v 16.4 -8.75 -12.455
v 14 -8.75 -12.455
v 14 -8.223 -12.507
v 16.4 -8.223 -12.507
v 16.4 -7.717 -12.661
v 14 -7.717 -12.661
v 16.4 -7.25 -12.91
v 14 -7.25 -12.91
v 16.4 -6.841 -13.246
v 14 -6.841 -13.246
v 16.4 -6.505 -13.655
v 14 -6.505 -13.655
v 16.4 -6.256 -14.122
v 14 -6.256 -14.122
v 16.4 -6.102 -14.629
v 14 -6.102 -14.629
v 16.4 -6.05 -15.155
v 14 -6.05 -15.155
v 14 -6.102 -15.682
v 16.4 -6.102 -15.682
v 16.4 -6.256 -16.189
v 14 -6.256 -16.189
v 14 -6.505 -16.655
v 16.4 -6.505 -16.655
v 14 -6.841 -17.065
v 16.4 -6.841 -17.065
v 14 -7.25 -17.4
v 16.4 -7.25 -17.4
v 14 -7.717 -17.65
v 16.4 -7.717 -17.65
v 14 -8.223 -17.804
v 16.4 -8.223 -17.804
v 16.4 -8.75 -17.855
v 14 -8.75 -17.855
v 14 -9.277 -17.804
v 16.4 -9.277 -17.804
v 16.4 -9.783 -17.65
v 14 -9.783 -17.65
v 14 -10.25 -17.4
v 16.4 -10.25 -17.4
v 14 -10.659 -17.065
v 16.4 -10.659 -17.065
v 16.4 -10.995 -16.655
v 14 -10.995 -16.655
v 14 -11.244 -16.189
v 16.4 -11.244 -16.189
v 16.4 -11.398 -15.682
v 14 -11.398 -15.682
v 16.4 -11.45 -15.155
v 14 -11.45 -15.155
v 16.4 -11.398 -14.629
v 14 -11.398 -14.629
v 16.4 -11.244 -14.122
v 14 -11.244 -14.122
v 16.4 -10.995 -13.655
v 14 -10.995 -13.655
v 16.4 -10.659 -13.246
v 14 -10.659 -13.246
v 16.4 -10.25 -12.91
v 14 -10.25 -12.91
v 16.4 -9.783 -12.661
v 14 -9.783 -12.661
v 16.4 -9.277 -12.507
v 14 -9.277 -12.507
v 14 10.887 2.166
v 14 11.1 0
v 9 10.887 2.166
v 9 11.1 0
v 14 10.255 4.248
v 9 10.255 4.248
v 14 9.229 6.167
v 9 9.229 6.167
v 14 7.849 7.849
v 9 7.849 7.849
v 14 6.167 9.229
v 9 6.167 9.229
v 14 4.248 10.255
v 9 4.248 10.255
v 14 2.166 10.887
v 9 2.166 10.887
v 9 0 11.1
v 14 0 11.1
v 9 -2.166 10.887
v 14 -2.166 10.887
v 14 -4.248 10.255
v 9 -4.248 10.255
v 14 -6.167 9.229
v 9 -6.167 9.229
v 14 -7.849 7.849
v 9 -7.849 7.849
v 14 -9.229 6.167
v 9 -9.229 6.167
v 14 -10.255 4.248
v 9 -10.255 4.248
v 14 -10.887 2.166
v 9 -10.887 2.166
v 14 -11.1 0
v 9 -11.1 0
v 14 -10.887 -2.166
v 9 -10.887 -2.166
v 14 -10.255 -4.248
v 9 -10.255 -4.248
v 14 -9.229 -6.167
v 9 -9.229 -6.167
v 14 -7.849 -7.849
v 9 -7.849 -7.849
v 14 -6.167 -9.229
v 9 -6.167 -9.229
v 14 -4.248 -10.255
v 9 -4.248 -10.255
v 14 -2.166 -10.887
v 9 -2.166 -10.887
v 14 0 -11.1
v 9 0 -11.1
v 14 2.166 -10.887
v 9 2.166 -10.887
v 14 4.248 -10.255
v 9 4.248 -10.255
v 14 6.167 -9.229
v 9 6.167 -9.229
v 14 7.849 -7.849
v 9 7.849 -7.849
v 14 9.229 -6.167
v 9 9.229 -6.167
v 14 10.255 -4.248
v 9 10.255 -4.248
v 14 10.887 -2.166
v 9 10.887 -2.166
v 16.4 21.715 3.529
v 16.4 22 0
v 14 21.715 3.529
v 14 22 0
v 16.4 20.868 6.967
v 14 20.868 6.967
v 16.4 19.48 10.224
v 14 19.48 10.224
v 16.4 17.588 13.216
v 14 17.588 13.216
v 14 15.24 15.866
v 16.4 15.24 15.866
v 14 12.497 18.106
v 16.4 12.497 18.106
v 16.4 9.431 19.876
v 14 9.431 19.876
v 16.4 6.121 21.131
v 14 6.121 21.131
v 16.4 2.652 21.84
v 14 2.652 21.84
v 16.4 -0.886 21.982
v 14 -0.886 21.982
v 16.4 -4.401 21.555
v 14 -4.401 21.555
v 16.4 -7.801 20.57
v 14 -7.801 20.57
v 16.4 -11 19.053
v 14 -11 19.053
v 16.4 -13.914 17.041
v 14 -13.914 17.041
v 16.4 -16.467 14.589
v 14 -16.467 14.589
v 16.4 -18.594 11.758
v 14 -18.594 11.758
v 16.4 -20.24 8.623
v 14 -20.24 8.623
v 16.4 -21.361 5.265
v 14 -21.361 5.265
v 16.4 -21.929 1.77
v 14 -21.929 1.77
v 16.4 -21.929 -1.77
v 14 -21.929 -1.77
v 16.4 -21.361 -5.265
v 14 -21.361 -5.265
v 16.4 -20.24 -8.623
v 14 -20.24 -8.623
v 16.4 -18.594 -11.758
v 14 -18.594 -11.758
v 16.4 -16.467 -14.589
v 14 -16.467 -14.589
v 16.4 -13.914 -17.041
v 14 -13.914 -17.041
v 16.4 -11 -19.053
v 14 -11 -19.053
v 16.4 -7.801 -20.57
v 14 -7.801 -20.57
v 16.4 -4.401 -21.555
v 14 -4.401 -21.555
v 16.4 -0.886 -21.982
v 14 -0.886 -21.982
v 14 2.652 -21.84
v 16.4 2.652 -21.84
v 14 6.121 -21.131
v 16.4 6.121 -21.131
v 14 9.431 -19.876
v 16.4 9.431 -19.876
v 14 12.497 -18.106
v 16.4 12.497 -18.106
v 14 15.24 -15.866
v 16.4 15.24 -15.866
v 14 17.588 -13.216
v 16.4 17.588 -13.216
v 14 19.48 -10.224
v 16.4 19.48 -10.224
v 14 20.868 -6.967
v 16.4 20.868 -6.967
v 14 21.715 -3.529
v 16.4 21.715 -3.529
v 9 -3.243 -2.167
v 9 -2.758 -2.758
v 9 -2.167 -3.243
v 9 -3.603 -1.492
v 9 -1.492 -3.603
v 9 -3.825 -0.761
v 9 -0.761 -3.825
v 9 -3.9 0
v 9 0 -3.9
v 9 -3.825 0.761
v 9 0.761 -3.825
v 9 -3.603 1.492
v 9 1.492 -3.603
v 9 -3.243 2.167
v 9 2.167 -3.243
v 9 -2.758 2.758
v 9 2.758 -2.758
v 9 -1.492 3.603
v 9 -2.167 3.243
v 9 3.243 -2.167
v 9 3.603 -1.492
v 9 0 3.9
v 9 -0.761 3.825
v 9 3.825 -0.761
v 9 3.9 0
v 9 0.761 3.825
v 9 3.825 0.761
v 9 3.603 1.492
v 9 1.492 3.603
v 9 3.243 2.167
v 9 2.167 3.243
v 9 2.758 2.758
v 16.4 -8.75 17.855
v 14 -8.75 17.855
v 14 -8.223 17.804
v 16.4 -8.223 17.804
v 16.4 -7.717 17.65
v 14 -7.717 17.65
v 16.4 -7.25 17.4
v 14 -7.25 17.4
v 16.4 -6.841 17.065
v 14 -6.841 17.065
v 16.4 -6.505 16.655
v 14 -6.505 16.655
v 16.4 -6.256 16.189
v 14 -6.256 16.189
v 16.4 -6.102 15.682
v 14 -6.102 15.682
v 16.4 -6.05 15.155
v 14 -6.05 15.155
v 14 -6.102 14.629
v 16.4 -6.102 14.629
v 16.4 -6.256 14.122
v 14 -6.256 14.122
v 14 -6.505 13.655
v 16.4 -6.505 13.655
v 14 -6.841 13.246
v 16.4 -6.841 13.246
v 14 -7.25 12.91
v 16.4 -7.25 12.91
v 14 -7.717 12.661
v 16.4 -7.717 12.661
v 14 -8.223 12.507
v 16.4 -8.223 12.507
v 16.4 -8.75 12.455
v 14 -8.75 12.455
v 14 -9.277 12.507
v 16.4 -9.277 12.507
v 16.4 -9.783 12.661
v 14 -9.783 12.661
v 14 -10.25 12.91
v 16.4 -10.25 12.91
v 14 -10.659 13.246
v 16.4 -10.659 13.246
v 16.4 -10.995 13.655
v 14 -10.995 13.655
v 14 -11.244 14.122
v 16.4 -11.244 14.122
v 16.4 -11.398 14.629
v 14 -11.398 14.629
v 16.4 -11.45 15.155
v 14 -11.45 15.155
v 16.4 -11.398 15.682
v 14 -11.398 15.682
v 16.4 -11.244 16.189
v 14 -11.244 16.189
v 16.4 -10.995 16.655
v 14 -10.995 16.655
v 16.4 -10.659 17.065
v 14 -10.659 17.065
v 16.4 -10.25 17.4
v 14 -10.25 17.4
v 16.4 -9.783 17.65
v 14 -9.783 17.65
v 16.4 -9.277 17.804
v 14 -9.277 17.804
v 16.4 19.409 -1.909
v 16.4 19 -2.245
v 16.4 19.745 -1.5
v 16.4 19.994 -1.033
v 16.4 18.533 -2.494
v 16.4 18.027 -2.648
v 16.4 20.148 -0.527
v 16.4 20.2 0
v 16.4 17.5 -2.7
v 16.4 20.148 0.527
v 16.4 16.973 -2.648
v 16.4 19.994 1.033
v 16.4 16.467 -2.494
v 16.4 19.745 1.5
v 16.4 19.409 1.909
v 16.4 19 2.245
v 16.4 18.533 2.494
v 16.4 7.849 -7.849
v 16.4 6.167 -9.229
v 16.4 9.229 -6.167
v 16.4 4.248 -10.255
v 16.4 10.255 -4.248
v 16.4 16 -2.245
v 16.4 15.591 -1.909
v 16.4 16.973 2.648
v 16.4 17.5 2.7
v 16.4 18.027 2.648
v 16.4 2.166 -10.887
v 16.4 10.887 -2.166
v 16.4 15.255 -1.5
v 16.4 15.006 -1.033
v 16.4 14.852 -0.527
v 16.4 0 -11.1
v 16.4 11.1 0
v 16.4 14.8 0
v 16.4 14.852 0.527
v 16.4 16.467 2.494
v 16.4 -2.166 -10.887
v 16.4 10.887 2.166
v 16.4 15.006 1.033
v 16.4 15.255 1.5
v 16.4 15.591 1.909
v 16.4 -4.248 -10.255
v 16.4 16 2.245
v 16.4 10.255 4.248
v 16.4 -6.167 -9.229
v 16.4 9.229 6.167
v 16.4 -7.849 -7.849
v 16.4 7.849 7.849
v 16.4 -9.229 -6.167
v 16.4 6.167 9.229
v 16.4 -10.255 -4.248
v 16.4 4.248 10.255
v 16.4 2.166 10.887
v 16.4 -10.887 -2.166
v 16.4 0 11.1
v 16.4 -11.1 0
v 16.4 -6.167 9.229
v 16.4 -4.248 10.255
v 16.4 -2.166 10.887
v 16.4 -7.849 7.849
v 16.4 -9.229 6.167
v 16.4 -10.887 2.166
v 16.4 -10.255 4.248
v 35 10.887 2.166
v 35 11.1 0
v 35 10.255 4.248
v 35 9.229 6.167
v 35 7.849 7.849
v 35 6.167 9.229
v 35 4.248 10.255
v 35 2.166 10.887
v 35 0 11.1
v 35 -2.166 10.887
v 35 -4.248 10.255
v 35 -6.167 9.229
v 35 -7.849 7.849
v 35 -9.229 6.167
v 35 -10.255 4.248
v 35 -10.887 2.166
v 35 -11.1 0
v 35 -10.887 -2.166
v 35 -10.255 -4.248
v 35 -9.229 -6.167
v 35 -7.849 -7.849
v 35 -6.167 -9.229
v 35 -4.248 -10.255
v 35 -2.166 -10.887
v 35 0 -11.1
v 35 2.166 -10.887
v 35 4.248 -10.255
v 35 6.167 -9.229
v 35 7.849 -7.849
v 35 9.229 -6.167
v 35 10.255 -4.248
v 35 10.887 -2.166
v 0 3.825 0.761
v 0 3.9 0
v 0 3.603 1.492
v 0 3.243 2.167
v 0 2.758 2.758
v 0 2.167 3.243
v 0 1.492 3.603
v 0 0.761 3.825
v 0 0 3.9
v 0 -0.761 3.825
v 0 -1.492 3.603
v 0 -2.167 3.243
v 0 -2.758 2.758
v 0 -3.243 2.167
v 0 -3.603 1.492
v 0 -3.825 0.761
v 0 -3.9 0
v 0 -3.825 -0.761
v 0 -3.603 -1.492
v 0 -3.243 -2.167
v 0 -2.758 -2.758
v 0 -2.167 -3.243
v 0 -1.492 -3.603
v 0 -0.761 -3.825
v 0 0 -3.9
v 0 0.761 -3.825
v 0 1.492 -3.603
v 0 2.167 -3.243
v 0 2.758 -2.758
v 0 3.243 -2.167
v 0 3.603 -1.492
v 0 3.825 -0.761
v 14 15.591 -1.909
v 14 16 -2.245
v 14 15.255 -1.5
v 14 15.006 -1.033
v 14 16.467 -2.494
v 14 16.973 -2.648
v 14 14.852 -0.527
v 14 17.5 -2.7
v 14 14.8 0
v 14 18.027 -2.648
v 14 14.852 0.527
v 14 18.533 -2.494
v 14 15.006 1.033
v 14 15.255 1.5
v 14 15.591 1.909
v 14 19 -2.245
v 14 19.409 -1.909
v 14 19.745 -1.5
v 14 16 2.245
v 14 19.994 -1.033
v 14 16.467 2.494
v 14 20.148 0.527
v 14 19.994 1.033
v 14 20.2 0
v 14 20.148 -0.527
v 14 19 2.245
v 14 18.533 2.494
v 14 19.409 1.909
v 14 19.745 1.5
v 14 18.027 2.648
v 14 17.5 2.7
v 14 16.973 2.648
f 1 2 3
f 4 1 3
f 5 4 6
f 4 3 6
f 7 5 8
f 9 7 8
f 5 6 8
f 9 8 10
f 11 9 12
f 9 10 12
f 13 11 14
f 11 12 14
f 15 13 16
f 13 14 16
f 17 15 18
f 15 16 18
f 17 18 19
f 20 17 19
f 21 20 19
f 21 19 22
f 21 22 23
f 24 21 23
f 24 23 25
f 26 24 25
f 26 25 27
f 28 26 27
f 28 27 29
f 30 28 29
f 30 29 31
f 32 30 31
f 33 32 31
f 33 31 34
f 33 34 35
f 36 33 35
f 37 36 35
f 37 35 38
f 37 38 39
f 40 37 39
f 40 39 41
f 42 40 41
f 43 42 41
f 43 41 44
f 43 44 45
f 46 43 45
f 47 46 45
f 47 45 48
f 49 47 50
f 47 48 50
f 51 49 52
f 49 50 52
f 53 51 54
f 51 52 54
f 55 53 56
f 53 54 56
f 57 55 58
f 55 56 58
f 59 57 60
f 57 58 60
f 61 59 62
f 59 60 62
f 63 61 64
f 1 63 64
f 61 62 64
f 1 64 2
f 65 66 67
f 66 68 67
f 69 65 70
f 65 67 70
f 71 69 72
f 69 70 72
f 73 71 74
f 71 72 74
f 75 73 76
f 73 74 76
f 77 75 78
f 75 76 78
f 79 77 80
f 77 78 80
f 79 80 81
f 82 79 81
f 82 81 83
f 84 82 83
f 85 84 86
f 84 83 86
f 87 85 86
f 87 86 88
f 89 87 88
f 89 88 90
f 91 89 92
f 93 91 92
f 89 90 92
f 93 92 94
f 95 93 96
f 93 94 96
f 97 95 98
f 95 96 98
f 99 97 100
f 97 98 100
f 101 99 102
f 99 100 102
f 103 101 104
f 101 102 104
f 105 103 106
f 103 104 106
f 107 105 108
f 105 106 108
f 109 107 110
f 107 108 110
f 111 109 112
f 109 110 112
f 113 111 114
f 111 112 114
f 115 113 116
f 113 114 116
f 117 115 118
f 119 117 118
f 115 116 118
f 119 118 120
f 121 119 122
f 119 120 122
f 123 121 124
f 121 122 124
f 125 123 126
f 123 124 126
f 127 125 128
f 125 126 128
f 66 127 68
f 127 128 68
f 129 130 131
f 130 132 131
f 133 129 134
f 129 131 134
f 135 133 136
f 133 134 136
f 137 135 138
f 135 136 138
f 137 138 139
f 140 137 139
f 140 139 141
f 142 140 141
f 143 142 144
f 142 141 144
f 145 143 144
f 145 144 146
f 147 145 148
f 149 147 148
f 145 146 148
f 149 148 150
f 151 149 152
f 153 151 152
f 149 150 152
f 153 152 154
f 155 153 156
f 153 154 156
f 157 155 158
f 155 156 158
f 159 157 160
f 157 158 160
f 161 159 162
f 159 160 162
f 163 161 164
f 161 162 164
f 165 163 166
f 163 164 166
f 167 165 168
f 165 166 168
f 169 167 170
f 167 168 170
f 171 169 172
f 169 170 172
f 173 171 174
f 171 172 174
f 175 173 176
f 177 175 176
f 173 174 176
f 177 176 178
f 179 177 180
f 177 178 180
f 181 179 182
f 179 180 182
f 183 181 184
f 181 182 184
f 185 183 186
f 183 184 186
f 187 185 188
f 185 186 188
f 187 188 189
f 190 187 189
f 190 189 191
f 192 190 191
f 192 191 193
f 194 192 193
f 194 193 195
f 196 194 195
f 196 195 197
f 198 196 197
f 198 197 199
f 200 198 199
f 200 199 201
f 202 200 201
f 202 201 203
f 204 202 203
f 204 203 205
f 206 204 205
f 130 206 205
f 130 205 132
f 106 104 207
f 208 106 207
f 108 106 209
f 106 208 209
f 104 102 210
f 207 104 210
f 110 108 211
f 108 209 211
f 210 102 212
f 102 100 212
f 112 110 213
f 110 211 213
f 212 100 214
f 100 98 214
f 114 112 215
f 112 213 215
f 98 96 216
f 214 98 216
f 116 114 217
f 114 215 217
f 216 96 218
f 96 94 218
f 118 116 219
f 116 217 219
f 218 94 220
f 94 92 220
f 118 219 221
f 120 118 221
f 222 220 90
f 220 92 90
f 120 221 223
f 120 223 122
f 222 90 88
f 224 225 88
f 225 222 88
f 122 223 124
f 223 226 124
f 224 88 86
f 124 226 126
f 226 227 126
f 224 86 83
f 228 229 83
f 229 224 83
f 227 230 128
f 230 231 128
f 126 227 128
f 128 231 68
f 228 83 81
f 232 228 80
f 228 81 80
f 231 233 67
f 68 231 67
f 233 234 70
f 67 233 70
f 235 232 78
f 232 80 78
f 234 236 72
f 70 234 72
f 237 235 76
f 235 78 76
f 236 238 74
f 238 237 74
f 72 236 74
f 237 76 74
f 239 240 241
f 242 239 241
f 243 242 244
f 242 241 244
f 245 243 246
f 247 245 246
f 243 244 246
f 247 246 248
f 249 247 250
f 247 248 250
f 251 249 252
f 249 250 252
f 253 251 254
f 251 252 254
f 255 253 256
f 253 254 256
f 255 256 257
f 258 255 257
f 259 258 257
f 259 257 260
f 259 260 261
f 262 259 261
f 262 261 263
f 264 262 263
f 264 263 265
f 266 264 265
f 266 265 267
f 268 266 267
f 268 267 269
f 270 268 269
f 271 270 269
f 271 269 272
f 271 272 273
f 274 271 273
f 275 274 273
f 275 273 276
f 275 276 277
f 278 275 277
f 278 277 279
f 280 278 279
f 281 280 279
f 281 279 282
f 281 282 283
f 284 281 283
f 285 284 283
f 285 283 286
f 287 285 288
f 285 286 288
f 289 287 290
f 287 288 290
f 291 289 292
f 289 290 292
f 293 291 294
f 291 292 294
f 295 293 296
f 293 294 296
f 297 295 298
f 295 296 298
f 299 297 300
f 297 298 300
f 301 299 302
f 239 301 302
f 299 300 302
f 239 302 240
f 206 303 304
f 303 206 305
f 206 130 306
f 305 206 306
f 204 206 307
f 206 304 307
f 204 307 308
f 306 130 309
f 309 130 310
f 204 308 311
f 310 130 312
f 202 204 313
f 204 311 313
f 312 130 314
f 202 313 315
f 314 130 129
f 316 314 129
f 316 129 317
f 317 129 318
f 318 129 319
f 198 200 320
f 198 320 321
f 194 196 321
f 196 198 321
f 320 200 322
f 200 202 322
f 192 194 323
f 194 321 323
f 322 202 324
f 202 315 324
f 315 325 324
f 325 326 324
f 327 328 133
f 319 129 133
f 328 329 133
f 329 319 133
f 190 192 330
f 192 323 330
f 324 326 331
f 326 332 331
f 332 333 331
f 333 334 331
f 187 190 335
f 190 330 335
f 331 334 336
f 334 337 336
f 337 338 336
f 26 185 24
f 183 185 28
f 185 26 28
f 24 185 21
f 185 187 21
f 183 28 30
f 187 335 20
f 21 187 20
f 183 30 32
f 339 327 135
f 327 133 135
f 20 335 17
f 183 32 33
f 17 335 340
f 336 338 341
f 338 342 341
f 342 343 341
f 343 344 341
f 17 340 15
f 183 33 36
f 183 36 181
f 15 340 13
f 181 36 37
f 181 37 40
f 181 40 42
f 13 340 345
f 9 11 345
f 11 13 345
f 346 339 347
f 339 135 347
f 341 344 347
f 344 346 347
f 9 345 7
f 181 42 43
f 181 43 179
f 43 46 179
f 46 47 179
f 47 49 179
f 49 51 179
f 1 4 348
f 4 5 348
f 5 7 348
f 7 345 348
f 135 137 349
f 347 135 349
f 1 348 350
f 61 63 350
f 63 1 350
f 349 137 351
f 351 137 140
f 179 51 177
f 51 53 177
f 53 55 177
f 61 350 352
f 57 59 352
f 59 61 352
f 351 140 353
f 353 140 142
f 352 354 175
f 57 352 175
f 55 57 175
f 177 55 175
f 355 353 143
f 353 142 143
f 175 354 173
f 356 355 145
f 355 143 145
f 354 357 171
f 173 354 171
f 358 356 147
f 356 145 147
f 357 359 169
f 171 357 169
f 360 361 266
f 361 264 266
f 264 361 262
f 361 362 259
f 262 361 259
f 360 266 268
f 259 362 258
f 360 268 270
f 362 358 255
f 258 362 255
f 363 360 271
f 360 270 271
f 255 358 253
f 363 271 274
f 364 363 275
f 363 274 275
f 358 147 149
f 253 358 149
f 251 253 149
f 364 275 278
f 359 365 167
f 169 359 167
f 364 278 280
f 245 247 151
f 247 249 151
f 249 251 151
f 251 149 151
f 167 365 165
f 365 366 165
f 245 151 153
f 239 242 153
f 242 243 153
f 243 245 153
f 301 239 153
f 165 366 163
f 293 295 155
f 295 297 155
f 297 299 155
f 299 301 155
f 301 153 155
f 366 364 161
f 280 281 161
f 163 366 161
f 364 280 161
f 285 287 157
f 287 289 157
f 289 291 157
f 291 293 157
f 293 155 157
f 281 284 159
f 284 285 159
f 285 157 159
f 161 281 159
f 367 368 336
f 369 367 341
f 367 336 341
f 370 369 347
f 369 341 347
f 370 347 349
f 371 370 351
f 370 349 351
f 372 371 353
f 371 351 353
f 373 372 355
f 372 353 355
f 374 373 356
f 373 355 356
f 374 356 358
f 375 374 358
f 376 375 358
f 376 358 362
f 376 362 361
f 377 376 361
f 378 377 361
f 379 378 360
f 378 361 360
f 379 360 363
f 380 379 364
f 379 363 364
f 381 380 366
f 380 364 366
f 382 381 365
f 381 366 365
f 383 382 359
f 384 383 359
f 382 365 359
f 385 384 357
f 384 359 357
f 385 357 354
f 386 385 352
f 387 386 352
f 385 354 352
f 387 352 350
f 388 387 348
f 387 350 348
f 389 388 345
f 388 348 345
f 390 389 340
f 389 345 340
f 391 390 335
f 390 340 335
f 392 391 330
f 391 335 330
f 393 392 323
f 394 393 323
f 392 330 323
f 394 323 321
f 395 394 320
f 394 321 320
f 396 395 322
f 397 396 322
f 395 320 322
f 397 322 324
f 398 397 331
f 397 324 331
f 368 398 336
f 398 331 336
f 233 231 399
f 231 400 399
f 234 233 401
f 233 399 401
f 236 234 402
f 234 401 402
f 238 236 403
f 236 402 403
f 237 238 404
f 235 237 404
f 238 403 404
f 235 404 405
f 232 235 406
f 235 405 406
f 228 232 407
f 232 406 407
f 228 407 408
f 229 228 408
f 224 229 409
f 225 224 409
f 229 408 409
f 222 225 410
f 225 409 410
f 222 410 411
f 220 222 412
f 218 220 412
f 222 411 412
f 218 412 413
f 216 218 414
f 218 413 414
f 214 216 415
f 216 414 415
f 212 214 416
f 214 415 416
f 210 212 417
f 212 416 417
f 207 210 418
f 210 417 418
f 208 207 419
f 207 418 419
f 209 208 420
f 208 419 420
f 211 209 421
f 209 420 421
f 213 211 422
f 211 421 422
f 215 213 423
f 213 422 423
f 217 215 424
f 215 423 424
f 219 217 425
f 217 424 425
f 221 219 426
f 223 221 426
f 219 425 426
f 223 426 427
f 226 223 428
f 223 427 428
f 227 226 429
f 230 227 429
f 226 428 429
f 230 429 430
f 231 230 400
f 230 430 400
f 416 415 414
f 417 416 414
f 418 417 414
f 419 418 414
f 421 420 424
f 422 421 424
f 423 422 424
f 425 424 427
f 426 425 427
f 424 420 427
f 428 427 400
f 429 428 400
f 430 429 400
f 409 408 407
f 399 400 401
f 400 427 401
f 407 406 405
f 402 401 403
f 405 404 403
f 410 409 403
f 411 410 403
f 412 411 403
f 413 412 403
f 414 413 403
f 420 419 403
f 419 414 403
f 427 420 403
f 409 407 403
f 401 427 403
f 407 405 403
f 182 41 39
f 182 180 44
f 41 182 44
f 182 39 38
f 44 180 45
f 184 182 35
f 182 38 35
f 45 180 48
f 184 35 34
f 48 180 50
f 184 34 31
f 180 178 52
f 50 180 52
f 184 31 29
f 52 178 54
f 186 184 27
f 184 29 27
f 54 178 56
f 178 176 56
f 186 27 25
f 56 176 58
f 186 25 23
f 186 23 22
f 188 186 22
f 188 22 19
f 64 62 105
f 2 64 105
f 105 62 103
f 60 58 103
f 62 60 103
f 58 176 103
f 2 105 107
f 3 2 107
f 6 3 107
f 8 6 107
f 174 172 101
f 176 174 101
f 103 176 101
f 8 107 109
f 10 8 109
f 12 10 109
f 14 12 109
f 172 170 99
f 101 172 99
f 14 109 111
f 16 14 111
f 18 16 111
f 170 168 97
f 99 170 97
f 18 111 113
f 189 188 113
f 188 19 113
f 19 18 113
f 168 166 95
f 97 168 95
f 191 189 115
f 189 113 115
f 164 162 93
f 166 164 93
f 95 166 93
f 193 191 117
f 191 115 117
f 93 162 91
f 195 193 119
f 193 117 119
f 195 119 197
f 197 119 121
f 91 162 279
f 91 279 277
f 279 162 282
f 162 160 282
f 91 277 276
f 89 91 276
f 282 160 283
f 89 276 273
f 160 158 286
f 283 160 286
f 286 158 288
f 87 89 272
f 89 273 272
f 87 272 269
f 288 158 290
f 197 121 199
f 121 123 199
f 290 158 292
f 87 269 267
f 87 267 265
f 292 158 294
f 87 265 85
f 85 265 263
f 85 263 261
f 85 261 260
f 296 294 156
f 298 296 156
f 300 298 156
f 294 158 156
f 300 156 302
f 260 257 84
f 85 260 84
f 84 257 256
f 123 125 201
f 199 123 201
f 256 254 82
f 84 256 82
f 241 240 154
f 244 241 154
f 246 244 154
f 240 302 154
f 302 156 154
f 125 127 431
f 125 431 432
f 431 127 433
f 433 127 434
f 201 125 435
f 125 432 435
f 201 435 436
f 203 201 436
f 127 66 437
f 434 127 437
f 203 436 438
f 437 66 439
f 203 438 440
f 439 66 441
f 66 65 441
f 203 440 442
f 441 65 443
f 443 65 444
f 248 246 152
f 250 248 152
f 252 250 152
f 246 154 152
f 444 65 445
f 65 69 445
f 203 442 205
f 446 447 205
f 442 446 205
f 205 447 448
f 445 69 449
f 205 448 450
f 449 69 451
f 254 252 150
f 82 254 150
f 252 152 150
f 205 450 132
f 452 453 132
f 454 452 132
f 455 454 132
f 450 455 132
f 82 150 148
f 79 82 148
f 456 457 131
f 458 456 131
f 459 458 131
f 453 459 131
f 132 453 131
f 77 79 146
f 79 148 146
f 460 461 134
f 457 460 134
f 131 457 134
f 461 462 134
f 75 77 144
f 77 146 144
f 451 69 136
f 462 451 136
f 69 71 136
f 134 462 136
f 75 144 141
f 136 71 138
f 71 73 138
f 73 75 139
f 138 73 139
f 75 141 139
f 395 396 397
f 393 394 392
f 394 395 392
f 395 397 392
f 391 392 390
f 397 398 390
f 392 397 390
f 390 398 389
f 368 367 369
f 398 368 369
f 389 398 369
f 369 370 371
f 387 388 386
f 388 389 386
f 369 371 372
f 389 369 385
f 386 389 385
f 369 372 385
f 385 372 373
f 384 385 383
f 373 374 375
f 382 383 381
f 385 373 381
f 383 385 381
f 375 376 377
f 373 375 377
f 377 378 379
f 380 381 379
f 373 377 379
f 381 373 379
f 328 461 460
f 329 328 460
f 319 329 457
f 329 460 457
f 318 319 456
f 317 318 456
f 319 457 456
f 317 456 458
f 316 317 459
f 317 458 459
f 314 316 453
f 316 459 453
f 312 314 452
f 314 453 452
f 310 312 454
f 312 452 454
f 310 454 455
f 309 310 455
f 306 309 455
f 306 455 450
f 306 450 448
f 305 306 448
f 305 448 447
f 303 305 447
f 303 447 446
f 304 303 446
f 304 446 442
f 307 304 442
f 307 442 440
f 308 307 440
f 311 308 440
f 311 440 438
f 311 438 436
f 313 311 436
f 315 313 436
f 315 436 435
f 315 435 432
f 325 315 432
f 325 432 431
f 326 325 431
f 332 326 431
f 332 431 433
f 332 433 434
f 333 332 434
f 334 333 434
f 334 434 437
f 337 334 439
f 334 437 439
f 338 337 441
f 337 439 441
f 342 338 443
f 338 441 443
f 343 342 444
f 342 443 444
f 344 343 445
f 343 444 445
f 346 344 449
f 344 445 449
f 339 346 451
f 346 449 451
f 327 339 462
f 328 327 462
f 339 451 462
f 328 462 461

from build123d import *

# Parameters (mm, degrees)
SKETCH2_R          = 2.7
CUT_EXTRUDE1_DEPTH = 22


with BuildPart() as part:
    # Sketch1 → Revolve1 (revolve)
    with BuildSketch(Plane.XY):
        Polygon((0, 0), (35, 0), (35, 11.1), (16.4, 11.1), (16.4, 22), (14, 22), (14, 11.1), (9, 11.1), (9, 3.9), (0, 3.9), align=None)
    revolve(axis=Axis((0, 0, 0), (1, 0, 0)))

    # Sketch2 → Cut-Extrude1 (cut, through all)
    with BuildSketch(Plane.ZY.offset(-14)):
        with Locations((0, 17.5)):
            Circle(SKETCH2_R)
        with Locations((15.155444566, -8.75)):
            Circle(SKETCH2_R)
        with Locations((-15.155444566, -8.75)):
            Circle(SKETCH2_R)
    extrude(amount=-CUT_EXTRUDE1_DEPTH, mode=Mode.SUBTRACT)


solid = part.part
